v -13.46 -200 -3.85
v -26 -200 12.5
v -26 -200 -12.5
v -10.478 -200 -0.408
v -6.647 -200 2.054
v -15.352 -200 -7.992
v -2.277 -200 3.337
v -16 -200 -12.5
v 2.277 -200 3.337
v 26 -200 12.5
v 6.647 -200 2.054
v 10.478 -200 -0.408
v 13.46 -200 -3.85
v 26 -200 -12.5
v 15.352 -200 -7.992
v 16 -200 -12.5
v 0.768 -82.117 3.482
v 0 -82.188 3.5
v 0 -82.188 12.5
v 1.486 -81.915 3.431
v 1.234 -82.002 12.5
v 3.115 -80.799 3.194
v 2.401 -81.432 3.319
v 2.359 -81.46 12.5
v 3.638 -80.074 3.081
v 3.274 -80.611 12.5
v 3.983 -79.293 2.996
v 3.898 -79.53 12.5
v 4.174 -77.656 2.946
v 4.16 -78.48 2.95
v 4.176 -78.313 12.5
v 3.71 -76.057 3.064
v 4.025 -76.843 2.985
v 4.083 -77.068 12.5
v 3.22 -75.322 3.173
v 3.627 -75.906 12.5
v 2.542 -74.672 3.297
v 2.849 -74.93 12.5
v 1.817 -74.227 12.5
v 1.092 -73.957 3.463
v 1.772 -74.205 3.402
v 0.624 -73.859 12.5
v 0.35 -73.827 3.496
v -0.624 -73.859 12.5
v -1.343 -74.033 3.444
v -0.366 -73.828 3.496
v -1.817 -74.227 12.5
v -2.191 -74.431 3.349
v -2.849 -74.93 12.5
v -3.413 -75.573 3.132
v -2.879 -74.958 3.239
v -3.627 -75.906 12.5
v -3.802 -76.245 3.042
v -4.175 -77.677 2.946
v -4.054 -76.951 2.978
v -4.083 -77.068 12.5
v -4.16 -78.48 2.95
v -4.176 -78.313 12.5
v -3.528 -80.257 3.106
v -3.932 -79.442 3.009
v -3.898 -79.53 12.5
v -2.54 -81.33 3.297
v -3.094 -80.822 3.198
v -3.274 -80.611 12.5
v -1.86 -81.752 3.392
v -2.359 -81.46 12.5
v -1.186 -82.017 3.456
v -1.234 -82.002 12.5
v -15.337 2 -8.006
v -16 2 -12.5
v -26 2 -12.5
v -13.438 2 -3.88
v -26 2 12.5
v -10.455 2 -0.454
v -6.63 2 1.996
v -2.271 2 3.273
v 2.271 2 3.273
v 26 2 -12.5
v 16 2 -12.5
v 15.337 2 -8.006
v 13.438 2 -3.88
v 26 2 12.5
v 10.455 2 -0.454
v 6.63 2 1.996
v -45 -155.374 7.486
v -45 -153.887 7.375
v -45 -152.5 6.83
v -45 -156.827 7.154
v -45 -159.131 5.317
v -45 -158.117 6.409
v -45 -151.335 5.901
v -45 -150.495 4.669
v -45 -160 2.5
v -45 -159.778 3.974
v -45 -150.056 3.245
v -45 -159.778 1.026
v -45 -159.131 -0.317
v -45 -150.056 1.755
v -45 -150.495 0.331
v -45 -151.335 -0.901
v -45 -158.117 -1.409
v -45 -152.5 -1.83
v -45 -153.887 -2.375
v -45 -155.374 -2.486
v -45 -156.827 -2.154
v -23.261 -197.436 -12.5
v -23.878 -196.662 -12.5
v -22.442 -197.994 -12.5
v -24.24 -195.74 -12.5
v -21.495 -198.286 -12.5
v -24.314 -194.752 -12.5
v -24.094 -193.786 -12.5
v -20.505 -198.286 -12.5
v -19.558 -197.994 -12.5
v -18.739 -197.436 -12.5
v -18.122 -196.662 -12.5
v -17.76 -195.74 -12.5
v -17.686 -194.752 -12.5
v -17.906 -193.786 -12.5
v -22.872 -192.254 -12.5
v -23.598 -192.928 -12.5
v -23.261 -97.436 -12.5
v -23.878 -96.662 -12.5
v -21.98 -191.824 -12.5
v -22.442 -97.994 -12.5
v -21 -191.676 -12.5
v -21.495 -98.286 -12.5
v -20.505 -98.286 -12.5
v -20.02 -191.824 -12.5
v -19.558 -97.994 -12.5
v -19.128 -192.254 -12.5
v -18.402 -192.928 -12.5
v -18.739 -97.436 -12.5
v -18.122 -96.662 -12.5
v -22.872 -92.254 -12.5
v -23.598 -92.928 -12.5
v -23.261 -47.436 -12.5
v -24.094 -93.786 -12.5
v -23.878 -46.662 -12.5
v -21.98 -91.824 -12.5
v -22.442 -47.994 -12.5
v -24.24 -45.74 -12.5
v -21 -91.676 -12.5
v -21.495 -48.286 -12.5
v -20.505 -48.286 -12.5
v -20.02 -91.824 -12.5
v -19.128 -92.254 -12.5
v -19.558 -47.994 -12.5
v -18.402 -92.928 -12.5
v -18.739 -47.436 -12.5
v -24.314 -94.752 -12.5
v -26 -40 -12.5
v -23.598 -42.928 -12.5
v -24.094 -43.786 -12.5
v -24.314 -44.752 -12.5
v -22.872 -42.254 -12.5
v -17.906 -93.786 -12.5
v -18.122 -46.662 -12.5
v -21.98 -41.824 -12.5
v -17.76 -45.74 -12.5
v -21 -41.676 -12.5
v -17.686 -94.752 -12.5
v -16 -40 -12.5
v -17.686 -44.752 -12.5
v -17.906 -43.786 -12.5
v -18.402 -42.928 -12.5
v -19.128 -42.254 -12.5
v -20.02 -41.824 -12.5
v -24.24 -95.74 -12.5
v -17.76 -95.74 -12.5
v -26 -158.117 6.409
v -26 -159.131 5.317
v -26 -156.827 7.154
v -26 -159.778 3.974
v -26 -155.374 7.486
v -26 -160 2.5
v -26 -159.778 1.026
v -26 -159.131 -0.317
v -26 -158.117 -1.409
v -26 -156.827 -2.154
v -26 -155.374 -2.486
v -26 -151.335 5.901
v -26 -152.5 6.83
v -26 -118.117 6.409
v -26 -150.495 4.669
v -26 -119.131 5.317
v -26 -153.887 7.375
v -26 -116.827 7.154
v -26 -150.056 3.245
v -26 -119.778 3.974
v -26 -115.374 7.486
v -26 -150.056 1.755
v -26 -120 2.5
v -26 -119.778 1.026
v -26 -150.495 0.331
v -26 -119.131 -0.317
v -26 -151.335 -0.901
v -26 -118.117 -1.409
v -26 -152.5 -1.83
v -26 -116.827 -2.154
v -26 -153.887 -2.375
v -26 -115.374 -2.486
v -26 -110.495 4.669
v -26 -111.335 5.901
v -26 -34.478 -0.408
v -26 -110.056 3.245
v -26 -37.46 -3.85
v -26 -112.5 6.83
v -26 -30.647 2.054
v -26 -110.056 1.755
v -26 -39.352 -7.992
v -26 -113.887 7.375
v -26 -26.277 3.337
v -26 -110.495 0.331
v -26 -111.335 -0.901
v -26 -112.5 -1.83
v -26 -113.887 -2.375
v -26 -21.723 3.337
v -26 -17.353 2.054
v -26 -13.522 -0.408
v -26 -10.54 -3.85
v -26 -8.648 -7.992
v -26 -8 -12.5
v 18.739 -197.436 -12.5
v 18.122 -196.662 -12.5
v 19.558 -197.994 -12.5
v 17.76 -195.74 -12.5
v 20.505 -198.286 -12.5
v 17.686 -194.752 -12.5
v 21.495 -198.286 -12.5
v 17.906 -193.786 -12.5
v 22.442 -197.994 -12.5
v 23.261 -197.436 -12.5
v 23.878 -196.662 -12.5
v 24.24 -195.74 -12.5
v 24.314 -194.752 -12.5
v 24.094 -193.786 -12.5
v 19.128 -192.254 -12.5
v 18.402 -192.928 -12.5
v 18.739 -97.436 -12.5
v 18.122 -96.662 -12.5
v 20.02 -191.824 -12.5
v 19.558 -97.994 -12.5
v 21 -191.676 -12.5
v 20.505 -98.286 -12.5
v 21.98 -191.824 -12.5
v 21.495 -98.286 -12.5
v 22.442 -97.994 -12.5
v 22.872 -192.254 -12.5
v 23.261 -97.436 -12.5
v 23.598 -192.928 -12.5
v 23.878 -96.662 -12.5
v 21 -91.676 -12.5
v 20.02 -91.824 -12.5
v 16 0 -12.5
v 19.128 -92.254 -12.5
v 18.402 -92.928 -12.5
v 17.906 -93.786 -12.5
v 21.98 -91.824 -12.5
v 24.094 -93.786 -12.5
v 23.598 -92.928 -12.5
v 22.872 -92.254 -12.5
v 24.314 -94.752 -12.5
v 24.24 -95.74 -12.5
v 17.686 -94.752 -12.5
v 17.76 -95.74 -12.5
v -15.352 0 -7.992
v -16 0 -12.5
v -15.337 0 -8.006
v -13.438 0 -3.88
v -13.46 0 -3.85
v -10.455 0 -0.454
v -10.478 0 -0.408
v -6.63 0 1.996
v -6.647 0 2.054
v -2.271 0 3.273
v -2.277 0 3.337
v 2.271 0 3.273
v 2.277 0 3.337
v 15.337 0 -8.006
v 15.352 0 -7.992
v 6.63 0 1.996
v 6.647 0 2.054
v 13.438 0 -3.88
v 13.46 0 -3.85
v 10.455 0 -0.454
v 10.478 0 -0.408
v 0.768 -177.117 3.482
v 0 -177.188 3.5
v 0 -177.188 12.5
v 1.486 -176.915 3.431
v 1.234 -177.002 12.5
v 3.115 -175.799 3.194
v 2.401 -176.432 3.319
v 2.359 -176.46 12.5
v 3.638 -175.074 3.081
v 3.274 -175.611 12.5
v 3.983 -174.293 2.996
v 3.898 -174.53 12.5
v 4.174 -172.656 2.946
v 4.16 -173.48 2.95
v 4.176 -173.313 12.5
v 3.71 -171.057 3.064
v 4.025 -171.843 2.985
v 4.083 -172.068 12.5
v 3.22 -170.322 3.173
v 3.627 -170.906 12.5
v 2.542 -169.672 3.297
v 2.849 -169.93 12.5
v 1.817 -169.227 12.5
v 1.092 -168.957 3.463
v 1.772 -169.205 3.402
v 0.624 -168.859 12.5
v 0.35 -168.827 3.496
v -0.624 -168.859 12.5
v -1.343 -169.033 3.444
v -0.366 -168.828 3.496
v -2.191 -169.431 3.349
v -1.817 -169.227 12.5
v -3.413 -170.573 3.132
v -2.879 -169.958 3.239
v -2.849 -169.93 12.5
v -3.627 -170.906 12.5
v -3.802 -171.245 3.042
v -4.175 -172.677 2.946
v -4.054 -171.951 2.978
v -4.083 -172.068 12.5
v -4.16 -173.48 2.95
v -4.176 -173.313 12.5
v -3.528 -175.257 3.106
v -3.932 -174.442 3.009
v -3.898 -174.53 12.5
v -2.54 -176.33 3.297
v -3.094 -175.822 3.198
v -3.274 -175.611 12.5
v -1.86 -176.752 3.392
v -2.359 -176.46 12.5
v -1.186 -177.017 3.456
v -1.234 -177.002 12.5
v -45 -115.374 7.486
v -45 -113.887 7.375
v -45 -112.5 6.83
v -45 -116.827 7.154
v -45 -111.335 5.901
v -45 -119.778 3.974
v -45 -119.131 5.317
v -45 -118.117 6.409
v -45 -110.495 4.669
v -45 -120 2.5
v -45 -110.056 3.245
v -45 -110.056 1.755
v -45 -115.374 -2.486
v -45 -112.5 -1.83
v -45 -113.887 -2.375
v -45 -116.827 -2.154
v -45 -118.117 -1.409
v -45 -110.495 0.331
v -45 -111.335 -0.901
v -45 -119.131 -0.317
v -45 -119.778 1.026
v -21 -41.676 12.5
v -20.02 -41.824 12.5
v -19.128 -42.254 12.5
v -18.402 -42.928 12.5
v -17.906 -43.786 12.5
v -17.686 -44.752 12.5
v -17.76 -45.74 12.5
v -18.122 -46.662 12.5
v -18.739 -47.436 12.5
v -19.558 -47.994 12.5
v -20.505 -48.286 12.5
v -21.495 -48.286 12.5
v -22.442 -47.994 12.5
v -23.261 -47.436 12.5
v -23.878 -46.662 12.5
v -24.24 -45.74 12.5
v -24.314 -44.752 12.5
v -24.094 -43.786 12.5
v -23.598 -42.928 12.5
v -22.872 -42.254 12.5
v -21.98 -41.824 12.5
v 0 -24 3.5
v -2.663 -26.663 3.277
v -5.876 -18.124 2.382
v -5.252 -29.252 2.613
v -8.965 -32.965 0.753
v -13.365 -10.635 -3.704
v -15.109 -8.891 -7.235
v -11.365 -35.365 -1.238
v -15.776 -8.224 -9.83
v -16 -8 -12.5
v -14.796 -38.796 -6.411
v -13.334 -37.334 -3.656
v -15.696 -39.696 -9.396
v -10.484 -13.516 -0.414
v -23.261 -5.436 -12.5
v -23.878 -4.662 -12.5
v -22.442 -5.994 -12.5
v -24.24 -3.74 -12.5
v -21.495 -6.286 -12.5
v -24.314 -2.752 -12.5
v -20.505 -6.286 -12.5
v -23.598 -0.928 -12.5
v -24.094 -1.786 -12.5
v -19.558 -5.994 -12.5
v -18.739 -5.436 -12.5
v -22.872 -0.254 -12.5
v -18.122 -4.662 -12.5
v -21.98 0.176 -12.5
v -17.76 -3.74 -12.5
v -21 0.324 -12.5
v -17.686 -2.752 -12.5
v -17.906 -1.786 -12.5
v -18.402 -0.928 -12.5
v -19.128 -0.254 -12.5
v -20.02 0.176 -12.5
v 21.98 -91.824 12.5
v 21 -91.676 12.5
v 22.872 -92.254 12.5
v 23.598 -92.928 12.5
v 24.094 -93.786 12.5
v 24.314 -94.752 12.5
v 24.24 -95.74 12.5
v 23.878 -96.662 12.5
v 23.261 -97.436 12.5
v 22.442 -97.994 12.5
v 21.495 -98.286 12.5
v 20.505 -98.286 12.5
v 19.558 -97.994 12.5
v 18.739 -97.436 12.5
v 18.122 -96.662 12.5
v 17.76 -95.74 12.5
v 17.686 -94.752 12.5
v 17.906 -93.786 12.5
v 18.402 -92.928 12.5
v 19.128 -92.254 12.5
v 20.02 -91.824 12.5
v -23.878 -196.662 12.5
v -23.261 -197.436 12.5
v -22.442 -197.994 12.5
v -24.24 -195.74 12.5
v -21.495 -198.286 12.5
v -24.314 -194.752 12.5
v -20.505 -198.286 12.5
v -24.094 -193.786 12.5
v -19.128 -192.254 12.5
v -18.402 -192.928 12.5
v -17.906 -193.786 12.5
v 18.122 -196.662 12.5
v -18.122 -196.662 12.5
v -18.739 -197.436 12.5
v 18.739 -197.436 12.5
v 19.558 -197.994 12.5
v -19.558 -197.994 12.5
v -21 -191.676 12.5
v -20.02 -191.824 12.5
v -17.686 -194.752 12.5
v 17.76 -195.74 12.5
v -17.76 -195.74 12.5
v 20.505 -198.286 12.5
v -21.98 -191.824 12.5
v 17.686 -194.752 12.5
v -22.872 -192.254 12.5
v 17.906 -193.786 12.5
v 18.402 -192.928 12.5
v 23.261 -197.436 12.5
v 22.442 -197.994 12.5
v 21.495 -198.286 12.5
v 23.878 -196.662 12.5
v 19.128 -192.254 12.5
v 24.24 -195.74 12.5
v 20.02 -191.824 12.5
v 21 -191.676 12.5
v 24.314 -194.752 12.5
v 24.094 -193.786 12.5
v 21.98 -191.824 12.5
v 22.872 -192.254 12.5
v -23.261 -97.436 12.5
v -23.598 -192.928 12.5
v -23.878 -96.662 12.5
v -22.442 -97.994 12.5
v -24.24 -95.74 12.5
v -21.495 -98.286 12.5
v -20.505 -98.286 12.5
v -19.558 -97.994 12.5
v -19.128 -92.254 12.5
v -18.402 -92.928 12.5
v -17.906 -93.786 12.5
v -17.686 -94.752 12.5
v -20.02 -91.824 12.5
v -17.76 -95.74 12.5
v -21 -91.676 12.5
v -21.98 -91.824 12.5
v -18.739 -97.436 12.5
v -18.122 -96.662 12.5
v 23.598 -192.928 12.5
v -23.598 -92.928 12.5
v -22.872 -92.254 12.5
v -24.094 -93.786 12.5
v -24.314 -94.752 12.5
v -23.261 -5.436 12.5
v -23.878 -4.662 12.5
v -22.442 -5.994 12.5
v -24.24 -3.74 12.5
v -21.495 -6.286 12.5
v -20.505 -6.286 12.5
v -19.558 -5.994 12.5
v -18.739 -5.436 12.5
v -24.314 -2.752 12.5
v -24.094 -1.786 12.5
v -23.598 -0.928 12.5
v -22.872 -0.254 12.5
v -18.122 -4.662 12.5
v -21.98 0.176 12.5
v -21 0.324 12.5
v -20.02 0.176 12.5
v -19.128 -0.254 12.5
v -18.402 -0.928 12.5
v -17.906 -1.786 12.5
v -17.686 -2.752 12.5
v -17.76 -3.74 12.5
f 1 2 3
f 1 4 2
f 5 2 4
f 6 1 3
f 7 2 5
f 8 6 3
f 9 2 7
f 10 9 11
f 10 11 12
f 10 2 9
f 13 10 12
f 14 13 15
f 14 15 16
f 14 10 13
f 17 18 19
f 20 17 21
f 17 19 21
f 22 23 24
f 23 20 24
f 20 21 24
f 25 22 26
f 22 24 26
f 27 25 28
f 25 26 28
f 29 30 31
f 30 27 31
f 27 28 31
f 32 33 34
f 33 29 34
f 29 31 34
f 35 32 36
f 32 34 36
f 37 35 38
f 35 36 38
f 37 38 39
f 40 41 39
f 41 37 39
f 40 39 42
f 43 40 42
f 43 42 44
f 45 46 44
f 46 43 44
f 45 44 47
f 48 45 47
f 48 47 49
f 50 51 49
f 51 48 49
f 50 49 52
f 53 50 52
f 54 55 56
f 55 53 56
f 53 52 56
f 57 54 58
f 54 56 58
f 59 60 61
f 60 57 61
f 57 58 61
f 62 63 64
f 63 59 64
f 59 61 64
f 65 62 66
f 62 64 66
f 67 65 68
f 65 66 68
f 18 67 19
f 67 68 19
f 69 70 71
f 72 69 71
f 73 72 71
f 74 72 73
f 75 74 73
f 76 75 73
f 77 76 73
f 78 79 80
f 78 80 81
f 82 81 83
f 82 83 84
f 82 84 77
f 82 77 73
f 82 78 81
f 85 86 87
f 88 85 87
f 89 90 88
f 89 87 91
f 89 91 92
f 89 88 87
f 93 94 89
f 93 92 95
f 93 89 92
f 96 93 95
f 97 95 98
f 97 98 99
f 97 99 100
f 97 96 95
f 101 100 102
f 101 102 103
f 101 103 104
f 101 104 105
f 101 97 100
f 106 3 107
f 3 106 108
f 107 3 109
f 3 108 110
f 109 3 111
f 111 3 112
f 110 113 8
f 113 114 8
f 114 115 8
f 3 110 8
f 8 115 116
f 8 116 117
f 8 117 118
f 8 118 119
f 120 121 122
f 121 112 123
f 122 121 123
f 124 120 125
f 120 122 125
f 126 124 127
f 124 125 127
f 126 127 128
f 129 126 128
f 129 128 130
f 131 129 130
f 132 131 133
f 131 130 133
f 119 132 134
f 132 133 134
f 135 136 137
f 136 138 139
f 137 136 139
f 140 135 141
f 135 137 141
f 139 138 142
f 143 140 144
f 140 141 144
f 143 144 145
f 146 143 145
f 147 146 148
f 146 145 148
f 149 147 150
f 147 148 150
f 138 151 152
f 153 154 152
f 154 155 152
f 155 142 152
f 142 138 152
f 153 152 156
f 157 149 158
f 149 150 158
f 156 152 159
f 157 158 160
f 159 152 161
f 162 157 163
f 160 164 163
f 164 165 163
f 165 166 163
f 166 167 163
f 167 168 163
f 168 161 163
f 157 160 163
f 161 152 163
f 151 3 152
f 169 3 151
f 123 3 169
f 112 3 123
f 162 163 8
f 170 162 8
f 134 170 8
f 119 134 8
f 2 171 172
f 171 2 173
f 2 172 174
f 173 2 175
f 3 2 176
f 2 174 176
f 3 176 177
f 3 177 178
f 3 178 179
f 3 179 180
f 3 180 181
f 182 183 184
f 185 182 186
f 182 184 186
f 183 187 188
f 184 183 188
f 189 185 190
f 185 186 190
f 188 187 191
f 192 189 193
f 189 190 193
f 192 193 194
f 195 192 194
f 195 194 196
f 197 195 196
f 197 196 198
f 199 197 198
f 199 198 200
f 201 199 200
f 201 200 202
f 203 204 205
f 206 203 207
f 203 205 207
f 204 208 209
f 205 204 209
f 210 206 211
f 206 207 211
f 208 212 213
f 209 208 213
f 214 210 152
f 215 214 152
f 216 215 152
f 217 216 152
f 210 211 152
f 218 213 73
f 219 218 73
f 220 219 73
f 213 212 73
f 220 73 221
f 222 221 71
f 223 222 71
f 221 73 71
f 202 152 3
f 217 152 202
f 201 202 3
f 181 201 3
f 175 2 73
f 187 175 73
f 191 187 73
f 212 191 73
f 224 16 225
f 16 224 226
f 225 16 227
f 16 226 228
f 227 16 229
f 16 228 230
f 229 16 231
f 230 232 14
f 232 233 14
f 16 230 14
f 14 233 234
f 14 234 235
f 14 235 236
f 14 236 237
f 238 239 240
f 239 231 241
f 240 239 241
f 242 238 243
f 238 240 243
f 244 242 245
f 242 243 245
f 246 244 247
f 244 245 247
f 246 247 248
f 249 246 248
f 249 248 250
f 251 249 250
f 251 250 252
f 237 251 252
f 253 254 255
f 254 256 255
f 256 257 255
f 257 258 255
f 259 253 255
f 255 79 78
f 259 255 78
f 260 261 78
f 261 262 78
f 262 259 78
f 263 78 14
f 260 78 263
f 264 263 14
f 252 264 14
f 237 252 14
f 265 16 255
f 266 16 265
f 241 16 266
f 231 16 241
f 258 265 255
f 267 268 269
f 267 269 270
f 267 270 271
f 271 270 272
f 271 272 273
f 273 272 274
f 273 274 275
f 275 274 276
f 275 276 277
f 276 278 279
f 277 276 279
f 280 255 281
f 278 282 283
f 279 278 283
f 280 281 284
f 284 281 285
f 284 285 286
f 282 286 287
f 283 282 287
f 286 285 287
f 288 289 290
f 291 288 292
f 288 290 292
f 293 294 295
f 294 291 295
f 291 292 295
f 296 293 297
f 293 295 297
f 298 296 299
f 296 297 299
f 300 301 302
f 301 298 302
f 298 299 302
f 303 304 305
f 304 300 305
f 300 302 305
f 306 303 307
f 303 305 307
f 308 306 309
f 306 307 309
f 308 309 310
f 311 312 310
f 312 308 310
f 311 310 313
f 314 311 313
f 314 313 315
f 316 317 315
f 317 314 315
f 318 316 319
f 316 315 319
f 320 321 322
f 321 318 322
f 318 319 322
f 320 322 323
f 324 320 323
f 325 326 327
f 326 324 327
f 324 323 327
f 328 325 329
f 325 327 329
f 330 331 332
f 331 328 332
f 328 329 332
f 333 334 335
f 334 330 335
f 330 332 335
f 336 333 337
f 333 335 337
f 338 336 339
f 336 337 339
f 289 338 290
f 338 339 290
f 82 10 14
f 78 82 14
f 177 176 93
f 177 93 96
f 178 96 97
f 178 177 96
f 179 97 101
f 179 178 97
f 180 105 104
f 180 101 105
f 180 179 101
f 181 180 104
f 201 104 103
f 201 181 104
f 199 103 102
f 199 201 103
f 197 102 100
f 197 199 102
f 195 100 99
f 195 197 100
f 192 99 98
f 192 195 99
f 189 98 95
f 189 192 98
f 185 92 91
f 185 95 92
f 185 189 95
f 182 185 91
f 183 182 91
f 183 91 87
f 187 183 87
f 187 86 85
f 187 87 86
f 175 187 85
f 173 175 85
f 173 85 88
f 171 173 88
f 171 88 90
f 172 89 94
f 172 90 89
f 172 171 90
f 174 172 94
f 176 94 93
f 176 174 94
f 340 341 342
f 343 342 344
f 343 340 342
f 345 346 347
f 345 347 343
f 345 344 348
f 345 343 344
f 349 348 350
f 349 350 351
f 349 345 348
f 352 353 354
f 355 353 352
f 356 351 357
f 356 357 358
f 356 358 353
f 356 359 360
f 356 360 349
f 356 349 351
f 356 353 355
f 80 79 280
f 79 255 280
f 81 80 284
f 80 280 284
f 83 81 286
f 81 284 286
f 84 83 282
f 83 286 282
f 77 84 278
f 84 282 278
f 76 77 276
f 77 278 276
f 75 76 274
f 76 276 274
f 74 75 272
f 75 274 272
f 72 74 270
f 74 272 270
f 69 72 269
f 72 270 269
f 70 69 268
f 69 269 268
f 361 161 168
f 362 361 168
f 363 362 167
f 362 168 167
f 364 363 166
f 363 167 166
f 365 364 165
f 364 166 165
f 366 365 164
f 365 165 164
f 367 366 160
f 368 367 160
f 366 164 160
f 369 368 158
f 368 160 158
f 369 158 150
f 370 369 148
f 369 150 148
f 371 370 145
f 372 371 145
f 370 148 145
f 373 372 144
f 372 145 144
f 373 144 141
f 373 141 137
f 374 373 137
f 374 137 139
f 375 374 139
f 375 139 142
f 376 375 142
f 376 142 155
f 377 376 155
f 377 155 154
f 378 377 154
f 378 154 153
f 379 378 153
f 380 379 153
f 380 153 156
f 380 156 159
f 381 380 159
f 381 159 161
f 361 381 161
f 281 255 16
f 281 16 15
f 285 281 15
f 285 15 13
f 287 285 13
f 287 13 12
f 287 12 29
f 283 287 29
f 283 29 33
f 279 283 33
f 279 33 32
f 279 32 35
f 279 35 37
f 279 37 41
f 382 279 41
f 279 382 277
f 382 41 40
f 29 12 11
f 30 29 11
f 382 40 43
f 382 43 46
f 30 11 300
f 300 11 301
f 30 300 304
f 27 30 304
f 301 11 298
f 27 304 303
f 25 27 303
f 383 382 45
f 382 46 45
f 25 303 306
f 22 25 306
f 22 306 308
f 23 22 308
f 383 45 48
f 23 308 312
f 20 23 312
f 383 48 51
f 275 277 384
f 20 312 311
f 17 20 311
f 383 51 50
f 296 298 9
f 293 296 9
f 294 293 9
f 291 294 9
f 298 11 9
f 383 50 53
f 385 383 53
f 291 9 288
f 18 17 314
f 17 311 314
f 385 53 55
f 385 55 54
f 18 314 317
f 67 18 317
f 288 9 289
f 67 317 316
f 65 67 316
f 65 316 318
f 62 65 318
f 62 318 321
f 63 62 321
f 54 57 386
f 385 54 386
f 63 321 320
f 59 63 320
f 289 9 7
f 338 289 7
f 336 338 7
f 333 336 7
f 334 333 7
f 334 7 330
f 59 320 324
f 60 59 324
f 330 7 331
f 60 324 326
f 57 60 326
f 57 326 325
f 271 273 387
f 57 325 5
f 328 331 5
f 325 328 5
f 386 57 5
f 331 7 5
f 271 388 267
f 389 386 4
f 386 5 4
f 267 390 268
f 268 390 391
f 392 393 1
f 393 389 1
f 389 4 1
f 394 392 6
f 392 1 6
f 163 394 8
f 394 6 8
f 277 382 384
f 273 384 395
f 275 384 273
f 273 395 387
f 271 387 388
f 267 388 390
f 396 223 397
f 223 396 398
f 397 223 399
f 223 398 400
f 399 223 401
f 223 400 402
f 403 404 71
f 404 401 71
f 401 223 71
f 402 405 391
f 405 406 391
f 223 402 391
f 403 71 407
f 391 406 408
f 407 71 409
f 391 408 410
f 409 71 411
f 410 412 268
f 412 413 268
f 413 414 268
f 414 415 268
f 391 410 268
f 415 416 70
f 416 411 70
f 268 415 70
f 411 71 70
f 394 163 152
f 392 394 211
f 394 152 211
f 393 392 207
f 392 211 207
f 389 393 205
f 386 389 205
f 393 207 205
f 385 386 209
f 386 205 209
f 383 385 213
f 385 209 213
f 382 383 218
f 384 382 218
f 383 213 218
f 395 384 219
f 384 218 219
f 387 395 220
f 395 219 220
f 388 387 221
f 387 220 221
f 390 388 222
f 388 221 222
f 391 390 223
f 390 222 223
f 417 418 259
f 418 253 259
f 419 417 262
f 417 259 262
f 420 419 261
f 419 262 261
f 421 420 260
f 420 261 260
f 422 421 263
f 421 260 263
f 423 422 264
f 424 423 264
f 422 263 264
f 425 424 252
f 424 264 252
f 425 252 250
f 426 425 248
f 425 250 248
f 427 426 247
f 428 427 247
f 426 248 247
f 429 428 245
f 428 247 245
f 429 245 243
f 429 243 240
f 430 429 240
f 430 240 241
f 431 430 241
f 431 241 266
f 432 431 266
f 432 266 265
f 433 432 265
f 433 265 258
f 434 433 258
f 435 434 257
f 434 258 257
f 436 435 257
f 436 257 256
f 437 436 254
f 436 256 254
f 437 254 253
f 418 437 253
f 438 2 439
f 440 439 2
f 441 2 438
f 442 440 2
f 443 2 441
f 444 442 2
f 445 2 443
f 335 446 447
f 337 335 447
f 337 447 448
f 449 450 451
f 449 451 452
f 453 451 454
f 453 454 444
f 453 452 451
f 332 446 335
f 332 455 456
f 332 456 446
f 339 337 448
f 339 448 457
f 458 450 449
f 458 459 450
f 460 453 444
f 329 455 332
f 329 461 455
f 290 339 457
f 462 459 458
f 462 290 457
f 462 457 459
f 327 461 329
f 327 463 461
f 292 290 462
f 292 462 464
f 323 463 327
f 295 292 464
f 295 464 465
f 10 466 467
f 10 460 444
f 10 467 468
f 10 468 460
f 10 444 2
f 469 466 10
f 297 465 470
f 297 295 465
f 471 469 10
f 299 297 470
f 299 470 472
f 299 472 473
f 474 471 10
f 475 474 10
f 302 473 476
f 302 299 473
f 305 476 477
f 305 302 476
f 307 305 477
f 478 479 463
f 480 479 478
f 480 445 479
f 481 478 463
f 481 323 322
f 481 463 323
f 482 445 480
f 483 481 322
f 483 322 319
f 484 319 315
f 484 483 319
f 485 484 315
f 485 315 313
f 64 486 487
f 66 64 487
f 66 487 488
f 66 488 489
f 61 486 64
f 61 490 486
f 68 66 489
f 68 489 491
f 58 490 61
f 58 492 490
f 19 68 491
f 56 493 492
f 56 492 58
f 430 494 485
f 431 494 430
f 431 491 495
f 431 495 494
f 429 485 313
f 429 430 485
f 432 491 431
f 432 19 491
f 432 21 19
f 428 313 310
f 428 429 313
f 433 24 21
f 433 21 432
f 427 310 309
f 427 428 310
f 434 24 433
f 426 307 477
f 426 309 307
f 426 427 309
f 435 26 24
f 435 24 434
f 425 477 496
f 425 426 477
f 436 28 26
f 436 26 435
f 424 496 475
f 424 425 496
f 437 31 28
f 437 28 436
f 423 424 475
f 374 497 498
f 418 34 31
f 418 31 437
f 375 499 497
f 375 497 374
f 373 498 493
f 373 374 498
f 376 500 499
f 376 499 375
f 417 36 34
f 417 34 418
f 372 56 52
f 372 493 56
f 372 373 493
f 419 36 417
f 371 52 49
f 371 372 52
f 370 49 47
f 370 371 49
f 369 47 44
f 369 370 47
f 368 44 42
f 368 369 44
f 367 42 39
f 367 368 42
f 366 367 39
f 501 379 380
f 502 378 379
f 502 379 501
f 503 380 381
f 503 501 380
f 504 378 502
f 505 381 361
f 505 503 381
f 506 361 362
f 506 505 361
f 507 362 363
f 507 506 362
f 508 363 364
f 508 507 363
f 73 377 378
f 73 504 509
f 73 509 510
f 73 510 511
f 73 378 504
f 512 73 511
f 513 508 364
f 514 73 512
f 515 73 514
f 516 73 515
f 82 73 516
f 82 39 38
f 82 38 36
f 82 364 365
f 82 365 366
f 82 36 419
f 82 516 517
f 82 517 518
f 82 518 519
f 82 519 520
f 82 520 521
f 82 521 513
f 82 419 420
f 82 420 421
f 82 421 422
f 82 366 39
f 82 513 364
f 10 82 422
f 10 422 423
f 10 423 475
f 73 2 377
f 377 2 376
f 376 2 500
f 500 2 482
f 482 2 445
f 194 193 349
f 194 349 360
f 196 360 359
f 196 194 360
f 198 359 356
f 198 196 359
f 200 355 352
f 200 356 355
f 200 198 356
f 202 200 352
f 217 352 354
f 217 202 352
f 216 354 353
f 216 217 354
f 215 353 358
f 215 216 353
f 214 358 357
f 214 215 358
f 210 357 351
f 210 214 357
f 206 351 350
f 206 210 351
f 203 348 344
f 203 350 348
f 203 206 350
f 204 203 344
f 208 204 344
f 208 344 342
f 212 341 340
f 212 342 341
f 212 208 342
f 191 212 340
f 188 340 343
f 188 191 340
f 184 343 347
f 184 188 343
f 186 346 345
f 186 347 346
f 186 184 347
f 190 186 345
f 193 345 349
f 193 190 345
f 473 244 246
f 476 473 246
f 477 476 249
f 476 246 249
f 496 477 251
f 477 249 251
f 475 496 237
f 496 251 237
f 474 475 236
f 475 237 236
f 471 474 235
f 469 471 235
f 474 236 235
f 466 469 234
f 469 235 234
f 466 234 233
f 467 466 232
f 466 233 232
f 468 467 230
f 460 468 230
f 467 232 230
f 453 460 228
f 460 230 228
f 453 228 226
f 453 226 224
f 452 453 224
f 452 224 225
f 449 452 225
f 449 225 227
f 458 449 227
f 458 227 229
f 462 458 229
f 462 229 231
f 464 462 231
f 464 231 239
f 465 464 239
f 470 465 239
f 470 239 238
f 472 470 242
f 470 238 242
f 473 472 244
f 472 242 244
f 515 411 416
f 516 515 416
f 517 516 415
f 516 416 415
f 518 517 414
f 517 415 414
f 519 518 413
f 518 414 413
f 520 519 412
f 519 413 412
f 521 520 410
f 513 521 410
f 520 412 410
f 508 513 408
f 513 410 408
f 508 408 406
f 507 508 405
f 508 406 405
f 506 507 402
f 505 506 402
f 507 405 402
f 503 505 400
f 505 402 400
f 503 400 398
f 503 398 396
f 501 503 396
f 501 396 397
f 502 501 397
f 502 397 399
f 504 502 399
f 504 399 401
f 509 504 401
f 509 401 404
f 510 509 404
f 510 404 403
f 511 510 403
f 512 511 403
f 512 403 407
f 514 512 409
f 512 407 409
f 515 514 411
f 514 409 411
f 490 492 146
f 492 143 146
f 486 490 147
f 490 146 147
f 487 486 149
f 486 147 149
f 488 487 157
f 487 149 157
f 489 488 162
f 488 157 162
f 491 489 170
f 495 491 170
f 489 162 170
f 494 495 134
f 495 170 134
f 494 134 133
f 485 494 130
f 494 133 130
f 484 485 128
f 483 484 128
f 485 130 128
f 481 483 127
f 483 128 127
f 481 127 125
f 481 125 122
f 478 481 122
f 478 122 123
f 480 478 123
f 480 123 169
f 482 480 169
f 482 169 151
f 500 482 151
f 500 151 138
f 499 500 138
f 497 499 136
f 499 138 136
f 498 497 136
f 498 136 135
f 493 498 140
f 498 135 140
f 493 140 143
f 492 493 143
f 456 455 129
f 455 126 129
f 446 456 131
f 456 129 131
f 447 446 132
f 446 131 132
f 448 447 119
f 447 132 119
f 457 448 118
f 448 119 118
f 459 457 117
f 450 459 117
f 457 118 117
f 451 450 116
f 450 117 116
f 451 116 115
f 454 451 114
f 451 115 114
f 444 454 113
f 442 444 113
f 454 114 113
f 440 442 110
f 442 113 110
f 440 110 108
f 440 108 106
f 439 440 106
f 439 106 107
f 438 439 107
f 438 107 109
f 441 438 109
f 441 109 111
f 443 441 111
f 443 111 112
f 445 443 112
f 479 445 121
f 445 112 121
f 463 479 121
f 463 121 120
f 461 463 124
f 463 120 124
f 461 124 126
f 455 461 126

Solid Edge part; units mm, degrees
sketch "Sketch1" plane through (0, 0, 0) normal (0, -1, 0) x (1, 0, 0)
  line L0 (-26, -12.5) -> (26, -12.5)
  line L1 (26, -12.5) -> (26, 12.5)
  line L2 (-26, 12.5) -> (26, 12.5)
  line L3 (-26, 12.5) -> (-26, -12.5)
  dimension "D1" = 25
  dimension "D2" = 52
extrude "Protrusion1" add sketch "Sketch1" along normal blind 200
sketch "Sketch2" plane through (0, -200, 0) normal (0, -1, 0) x (1, 0, 0)
  line L0 (-16, -12.5) -> (16, -12.5)
  arc A0 (-16, -12.5) -> (16, -12.5) centre (0, -12.5) cw
  dimension "D1" = 32
extrude "Cutout1" cut sketch "Sketch2" against normal up to next
sketch "Sketch3" plane through (-26, -100, 0) normal (-1, 0, 0) x (0, -1, 0)
  circle A0 centre (55, 2.5) radius 5
  circle A1 centre (15, 2.5) radius 5
  dimension "D1" = 40
  dimension "D2" = 10
  dimension "D3" = 10
  dimension "D4" = 10
  dimension "D5" = 14.5
extrude "ExtrudedProtrusion_3" add sketch "Sketch3" along normal blind 19
cosmetic_thread "Thread1" size "Tr 10 x 2"
cosmetic_thread "Thread2" size "Tr 10 x 2"
hole "Hole1" at (-21, -195, -12.5) direction (0, 0, 1) diameter 6.647 end up to next
hole "Hole2" at (-21, -95, -12.5) direction (0, 0, 1) diameter 6.647 end up to next
hole "Hole3" at (21, -195, -12.5) direction (0, 0, 1) diameter 6.647 end up to next
hole "Hole4" at (21, -95, -12.5) direction (0, 0, 1) diameter 6.647 end up to next
sketch "Sketch4" plane through (-26, -100, 0) normal (-1, 0, 0) x (0, -1, 0)
  line L0 (-92, -12.5) -> (-60, -12.5)
  arc A0 (-60, -12.5) -> (-92, -12.5) centre (-76, -12.5) ccw
  dimension "D1" = 24
  dimension "D2" = 16
extrude "Cutout2" cut sketch "Sketch4" against normal up to next
sketch "Sketch5" plane through (0, 0, 0) normal (0, 1, 0) x (0, 0, -1)
  line L0 (12.5, 16) -> (12.5, 26)
  line L1 (12.5, 26) -> (-12.5, 26)
  line L2 (-12.5, 26) -> (-12.5, -26)
  line L3 (-12.5, -26) -> (12.5, -26)
  line L4 (12.5, -26) -> (12.5, -16)
  arc A0 (12.5, -16) -> (12.5, 16) centre (12.5655, 0) cw
extrude "ExtrudedProtrusion_4" add sketch "Sketch5" along normal blind 2
hole "Hole_17" at (-21, -45, -12.5) direction (0, 0, 1) diameter 6.647 end up to next
hole "Hole5" at (-21, -3, -12.5) direction (0, 0, 1) diameter 6.647 end up to next
hole "Hole_21" at (0, -173, 12.5) direction (0, 0, -1) diameter 8.376 end up to next
hole "Hole6" at (0, -78, 12.5) direction (0, 0, -1) diameter 8.376 end up to next
properties material "Stainless steel"
